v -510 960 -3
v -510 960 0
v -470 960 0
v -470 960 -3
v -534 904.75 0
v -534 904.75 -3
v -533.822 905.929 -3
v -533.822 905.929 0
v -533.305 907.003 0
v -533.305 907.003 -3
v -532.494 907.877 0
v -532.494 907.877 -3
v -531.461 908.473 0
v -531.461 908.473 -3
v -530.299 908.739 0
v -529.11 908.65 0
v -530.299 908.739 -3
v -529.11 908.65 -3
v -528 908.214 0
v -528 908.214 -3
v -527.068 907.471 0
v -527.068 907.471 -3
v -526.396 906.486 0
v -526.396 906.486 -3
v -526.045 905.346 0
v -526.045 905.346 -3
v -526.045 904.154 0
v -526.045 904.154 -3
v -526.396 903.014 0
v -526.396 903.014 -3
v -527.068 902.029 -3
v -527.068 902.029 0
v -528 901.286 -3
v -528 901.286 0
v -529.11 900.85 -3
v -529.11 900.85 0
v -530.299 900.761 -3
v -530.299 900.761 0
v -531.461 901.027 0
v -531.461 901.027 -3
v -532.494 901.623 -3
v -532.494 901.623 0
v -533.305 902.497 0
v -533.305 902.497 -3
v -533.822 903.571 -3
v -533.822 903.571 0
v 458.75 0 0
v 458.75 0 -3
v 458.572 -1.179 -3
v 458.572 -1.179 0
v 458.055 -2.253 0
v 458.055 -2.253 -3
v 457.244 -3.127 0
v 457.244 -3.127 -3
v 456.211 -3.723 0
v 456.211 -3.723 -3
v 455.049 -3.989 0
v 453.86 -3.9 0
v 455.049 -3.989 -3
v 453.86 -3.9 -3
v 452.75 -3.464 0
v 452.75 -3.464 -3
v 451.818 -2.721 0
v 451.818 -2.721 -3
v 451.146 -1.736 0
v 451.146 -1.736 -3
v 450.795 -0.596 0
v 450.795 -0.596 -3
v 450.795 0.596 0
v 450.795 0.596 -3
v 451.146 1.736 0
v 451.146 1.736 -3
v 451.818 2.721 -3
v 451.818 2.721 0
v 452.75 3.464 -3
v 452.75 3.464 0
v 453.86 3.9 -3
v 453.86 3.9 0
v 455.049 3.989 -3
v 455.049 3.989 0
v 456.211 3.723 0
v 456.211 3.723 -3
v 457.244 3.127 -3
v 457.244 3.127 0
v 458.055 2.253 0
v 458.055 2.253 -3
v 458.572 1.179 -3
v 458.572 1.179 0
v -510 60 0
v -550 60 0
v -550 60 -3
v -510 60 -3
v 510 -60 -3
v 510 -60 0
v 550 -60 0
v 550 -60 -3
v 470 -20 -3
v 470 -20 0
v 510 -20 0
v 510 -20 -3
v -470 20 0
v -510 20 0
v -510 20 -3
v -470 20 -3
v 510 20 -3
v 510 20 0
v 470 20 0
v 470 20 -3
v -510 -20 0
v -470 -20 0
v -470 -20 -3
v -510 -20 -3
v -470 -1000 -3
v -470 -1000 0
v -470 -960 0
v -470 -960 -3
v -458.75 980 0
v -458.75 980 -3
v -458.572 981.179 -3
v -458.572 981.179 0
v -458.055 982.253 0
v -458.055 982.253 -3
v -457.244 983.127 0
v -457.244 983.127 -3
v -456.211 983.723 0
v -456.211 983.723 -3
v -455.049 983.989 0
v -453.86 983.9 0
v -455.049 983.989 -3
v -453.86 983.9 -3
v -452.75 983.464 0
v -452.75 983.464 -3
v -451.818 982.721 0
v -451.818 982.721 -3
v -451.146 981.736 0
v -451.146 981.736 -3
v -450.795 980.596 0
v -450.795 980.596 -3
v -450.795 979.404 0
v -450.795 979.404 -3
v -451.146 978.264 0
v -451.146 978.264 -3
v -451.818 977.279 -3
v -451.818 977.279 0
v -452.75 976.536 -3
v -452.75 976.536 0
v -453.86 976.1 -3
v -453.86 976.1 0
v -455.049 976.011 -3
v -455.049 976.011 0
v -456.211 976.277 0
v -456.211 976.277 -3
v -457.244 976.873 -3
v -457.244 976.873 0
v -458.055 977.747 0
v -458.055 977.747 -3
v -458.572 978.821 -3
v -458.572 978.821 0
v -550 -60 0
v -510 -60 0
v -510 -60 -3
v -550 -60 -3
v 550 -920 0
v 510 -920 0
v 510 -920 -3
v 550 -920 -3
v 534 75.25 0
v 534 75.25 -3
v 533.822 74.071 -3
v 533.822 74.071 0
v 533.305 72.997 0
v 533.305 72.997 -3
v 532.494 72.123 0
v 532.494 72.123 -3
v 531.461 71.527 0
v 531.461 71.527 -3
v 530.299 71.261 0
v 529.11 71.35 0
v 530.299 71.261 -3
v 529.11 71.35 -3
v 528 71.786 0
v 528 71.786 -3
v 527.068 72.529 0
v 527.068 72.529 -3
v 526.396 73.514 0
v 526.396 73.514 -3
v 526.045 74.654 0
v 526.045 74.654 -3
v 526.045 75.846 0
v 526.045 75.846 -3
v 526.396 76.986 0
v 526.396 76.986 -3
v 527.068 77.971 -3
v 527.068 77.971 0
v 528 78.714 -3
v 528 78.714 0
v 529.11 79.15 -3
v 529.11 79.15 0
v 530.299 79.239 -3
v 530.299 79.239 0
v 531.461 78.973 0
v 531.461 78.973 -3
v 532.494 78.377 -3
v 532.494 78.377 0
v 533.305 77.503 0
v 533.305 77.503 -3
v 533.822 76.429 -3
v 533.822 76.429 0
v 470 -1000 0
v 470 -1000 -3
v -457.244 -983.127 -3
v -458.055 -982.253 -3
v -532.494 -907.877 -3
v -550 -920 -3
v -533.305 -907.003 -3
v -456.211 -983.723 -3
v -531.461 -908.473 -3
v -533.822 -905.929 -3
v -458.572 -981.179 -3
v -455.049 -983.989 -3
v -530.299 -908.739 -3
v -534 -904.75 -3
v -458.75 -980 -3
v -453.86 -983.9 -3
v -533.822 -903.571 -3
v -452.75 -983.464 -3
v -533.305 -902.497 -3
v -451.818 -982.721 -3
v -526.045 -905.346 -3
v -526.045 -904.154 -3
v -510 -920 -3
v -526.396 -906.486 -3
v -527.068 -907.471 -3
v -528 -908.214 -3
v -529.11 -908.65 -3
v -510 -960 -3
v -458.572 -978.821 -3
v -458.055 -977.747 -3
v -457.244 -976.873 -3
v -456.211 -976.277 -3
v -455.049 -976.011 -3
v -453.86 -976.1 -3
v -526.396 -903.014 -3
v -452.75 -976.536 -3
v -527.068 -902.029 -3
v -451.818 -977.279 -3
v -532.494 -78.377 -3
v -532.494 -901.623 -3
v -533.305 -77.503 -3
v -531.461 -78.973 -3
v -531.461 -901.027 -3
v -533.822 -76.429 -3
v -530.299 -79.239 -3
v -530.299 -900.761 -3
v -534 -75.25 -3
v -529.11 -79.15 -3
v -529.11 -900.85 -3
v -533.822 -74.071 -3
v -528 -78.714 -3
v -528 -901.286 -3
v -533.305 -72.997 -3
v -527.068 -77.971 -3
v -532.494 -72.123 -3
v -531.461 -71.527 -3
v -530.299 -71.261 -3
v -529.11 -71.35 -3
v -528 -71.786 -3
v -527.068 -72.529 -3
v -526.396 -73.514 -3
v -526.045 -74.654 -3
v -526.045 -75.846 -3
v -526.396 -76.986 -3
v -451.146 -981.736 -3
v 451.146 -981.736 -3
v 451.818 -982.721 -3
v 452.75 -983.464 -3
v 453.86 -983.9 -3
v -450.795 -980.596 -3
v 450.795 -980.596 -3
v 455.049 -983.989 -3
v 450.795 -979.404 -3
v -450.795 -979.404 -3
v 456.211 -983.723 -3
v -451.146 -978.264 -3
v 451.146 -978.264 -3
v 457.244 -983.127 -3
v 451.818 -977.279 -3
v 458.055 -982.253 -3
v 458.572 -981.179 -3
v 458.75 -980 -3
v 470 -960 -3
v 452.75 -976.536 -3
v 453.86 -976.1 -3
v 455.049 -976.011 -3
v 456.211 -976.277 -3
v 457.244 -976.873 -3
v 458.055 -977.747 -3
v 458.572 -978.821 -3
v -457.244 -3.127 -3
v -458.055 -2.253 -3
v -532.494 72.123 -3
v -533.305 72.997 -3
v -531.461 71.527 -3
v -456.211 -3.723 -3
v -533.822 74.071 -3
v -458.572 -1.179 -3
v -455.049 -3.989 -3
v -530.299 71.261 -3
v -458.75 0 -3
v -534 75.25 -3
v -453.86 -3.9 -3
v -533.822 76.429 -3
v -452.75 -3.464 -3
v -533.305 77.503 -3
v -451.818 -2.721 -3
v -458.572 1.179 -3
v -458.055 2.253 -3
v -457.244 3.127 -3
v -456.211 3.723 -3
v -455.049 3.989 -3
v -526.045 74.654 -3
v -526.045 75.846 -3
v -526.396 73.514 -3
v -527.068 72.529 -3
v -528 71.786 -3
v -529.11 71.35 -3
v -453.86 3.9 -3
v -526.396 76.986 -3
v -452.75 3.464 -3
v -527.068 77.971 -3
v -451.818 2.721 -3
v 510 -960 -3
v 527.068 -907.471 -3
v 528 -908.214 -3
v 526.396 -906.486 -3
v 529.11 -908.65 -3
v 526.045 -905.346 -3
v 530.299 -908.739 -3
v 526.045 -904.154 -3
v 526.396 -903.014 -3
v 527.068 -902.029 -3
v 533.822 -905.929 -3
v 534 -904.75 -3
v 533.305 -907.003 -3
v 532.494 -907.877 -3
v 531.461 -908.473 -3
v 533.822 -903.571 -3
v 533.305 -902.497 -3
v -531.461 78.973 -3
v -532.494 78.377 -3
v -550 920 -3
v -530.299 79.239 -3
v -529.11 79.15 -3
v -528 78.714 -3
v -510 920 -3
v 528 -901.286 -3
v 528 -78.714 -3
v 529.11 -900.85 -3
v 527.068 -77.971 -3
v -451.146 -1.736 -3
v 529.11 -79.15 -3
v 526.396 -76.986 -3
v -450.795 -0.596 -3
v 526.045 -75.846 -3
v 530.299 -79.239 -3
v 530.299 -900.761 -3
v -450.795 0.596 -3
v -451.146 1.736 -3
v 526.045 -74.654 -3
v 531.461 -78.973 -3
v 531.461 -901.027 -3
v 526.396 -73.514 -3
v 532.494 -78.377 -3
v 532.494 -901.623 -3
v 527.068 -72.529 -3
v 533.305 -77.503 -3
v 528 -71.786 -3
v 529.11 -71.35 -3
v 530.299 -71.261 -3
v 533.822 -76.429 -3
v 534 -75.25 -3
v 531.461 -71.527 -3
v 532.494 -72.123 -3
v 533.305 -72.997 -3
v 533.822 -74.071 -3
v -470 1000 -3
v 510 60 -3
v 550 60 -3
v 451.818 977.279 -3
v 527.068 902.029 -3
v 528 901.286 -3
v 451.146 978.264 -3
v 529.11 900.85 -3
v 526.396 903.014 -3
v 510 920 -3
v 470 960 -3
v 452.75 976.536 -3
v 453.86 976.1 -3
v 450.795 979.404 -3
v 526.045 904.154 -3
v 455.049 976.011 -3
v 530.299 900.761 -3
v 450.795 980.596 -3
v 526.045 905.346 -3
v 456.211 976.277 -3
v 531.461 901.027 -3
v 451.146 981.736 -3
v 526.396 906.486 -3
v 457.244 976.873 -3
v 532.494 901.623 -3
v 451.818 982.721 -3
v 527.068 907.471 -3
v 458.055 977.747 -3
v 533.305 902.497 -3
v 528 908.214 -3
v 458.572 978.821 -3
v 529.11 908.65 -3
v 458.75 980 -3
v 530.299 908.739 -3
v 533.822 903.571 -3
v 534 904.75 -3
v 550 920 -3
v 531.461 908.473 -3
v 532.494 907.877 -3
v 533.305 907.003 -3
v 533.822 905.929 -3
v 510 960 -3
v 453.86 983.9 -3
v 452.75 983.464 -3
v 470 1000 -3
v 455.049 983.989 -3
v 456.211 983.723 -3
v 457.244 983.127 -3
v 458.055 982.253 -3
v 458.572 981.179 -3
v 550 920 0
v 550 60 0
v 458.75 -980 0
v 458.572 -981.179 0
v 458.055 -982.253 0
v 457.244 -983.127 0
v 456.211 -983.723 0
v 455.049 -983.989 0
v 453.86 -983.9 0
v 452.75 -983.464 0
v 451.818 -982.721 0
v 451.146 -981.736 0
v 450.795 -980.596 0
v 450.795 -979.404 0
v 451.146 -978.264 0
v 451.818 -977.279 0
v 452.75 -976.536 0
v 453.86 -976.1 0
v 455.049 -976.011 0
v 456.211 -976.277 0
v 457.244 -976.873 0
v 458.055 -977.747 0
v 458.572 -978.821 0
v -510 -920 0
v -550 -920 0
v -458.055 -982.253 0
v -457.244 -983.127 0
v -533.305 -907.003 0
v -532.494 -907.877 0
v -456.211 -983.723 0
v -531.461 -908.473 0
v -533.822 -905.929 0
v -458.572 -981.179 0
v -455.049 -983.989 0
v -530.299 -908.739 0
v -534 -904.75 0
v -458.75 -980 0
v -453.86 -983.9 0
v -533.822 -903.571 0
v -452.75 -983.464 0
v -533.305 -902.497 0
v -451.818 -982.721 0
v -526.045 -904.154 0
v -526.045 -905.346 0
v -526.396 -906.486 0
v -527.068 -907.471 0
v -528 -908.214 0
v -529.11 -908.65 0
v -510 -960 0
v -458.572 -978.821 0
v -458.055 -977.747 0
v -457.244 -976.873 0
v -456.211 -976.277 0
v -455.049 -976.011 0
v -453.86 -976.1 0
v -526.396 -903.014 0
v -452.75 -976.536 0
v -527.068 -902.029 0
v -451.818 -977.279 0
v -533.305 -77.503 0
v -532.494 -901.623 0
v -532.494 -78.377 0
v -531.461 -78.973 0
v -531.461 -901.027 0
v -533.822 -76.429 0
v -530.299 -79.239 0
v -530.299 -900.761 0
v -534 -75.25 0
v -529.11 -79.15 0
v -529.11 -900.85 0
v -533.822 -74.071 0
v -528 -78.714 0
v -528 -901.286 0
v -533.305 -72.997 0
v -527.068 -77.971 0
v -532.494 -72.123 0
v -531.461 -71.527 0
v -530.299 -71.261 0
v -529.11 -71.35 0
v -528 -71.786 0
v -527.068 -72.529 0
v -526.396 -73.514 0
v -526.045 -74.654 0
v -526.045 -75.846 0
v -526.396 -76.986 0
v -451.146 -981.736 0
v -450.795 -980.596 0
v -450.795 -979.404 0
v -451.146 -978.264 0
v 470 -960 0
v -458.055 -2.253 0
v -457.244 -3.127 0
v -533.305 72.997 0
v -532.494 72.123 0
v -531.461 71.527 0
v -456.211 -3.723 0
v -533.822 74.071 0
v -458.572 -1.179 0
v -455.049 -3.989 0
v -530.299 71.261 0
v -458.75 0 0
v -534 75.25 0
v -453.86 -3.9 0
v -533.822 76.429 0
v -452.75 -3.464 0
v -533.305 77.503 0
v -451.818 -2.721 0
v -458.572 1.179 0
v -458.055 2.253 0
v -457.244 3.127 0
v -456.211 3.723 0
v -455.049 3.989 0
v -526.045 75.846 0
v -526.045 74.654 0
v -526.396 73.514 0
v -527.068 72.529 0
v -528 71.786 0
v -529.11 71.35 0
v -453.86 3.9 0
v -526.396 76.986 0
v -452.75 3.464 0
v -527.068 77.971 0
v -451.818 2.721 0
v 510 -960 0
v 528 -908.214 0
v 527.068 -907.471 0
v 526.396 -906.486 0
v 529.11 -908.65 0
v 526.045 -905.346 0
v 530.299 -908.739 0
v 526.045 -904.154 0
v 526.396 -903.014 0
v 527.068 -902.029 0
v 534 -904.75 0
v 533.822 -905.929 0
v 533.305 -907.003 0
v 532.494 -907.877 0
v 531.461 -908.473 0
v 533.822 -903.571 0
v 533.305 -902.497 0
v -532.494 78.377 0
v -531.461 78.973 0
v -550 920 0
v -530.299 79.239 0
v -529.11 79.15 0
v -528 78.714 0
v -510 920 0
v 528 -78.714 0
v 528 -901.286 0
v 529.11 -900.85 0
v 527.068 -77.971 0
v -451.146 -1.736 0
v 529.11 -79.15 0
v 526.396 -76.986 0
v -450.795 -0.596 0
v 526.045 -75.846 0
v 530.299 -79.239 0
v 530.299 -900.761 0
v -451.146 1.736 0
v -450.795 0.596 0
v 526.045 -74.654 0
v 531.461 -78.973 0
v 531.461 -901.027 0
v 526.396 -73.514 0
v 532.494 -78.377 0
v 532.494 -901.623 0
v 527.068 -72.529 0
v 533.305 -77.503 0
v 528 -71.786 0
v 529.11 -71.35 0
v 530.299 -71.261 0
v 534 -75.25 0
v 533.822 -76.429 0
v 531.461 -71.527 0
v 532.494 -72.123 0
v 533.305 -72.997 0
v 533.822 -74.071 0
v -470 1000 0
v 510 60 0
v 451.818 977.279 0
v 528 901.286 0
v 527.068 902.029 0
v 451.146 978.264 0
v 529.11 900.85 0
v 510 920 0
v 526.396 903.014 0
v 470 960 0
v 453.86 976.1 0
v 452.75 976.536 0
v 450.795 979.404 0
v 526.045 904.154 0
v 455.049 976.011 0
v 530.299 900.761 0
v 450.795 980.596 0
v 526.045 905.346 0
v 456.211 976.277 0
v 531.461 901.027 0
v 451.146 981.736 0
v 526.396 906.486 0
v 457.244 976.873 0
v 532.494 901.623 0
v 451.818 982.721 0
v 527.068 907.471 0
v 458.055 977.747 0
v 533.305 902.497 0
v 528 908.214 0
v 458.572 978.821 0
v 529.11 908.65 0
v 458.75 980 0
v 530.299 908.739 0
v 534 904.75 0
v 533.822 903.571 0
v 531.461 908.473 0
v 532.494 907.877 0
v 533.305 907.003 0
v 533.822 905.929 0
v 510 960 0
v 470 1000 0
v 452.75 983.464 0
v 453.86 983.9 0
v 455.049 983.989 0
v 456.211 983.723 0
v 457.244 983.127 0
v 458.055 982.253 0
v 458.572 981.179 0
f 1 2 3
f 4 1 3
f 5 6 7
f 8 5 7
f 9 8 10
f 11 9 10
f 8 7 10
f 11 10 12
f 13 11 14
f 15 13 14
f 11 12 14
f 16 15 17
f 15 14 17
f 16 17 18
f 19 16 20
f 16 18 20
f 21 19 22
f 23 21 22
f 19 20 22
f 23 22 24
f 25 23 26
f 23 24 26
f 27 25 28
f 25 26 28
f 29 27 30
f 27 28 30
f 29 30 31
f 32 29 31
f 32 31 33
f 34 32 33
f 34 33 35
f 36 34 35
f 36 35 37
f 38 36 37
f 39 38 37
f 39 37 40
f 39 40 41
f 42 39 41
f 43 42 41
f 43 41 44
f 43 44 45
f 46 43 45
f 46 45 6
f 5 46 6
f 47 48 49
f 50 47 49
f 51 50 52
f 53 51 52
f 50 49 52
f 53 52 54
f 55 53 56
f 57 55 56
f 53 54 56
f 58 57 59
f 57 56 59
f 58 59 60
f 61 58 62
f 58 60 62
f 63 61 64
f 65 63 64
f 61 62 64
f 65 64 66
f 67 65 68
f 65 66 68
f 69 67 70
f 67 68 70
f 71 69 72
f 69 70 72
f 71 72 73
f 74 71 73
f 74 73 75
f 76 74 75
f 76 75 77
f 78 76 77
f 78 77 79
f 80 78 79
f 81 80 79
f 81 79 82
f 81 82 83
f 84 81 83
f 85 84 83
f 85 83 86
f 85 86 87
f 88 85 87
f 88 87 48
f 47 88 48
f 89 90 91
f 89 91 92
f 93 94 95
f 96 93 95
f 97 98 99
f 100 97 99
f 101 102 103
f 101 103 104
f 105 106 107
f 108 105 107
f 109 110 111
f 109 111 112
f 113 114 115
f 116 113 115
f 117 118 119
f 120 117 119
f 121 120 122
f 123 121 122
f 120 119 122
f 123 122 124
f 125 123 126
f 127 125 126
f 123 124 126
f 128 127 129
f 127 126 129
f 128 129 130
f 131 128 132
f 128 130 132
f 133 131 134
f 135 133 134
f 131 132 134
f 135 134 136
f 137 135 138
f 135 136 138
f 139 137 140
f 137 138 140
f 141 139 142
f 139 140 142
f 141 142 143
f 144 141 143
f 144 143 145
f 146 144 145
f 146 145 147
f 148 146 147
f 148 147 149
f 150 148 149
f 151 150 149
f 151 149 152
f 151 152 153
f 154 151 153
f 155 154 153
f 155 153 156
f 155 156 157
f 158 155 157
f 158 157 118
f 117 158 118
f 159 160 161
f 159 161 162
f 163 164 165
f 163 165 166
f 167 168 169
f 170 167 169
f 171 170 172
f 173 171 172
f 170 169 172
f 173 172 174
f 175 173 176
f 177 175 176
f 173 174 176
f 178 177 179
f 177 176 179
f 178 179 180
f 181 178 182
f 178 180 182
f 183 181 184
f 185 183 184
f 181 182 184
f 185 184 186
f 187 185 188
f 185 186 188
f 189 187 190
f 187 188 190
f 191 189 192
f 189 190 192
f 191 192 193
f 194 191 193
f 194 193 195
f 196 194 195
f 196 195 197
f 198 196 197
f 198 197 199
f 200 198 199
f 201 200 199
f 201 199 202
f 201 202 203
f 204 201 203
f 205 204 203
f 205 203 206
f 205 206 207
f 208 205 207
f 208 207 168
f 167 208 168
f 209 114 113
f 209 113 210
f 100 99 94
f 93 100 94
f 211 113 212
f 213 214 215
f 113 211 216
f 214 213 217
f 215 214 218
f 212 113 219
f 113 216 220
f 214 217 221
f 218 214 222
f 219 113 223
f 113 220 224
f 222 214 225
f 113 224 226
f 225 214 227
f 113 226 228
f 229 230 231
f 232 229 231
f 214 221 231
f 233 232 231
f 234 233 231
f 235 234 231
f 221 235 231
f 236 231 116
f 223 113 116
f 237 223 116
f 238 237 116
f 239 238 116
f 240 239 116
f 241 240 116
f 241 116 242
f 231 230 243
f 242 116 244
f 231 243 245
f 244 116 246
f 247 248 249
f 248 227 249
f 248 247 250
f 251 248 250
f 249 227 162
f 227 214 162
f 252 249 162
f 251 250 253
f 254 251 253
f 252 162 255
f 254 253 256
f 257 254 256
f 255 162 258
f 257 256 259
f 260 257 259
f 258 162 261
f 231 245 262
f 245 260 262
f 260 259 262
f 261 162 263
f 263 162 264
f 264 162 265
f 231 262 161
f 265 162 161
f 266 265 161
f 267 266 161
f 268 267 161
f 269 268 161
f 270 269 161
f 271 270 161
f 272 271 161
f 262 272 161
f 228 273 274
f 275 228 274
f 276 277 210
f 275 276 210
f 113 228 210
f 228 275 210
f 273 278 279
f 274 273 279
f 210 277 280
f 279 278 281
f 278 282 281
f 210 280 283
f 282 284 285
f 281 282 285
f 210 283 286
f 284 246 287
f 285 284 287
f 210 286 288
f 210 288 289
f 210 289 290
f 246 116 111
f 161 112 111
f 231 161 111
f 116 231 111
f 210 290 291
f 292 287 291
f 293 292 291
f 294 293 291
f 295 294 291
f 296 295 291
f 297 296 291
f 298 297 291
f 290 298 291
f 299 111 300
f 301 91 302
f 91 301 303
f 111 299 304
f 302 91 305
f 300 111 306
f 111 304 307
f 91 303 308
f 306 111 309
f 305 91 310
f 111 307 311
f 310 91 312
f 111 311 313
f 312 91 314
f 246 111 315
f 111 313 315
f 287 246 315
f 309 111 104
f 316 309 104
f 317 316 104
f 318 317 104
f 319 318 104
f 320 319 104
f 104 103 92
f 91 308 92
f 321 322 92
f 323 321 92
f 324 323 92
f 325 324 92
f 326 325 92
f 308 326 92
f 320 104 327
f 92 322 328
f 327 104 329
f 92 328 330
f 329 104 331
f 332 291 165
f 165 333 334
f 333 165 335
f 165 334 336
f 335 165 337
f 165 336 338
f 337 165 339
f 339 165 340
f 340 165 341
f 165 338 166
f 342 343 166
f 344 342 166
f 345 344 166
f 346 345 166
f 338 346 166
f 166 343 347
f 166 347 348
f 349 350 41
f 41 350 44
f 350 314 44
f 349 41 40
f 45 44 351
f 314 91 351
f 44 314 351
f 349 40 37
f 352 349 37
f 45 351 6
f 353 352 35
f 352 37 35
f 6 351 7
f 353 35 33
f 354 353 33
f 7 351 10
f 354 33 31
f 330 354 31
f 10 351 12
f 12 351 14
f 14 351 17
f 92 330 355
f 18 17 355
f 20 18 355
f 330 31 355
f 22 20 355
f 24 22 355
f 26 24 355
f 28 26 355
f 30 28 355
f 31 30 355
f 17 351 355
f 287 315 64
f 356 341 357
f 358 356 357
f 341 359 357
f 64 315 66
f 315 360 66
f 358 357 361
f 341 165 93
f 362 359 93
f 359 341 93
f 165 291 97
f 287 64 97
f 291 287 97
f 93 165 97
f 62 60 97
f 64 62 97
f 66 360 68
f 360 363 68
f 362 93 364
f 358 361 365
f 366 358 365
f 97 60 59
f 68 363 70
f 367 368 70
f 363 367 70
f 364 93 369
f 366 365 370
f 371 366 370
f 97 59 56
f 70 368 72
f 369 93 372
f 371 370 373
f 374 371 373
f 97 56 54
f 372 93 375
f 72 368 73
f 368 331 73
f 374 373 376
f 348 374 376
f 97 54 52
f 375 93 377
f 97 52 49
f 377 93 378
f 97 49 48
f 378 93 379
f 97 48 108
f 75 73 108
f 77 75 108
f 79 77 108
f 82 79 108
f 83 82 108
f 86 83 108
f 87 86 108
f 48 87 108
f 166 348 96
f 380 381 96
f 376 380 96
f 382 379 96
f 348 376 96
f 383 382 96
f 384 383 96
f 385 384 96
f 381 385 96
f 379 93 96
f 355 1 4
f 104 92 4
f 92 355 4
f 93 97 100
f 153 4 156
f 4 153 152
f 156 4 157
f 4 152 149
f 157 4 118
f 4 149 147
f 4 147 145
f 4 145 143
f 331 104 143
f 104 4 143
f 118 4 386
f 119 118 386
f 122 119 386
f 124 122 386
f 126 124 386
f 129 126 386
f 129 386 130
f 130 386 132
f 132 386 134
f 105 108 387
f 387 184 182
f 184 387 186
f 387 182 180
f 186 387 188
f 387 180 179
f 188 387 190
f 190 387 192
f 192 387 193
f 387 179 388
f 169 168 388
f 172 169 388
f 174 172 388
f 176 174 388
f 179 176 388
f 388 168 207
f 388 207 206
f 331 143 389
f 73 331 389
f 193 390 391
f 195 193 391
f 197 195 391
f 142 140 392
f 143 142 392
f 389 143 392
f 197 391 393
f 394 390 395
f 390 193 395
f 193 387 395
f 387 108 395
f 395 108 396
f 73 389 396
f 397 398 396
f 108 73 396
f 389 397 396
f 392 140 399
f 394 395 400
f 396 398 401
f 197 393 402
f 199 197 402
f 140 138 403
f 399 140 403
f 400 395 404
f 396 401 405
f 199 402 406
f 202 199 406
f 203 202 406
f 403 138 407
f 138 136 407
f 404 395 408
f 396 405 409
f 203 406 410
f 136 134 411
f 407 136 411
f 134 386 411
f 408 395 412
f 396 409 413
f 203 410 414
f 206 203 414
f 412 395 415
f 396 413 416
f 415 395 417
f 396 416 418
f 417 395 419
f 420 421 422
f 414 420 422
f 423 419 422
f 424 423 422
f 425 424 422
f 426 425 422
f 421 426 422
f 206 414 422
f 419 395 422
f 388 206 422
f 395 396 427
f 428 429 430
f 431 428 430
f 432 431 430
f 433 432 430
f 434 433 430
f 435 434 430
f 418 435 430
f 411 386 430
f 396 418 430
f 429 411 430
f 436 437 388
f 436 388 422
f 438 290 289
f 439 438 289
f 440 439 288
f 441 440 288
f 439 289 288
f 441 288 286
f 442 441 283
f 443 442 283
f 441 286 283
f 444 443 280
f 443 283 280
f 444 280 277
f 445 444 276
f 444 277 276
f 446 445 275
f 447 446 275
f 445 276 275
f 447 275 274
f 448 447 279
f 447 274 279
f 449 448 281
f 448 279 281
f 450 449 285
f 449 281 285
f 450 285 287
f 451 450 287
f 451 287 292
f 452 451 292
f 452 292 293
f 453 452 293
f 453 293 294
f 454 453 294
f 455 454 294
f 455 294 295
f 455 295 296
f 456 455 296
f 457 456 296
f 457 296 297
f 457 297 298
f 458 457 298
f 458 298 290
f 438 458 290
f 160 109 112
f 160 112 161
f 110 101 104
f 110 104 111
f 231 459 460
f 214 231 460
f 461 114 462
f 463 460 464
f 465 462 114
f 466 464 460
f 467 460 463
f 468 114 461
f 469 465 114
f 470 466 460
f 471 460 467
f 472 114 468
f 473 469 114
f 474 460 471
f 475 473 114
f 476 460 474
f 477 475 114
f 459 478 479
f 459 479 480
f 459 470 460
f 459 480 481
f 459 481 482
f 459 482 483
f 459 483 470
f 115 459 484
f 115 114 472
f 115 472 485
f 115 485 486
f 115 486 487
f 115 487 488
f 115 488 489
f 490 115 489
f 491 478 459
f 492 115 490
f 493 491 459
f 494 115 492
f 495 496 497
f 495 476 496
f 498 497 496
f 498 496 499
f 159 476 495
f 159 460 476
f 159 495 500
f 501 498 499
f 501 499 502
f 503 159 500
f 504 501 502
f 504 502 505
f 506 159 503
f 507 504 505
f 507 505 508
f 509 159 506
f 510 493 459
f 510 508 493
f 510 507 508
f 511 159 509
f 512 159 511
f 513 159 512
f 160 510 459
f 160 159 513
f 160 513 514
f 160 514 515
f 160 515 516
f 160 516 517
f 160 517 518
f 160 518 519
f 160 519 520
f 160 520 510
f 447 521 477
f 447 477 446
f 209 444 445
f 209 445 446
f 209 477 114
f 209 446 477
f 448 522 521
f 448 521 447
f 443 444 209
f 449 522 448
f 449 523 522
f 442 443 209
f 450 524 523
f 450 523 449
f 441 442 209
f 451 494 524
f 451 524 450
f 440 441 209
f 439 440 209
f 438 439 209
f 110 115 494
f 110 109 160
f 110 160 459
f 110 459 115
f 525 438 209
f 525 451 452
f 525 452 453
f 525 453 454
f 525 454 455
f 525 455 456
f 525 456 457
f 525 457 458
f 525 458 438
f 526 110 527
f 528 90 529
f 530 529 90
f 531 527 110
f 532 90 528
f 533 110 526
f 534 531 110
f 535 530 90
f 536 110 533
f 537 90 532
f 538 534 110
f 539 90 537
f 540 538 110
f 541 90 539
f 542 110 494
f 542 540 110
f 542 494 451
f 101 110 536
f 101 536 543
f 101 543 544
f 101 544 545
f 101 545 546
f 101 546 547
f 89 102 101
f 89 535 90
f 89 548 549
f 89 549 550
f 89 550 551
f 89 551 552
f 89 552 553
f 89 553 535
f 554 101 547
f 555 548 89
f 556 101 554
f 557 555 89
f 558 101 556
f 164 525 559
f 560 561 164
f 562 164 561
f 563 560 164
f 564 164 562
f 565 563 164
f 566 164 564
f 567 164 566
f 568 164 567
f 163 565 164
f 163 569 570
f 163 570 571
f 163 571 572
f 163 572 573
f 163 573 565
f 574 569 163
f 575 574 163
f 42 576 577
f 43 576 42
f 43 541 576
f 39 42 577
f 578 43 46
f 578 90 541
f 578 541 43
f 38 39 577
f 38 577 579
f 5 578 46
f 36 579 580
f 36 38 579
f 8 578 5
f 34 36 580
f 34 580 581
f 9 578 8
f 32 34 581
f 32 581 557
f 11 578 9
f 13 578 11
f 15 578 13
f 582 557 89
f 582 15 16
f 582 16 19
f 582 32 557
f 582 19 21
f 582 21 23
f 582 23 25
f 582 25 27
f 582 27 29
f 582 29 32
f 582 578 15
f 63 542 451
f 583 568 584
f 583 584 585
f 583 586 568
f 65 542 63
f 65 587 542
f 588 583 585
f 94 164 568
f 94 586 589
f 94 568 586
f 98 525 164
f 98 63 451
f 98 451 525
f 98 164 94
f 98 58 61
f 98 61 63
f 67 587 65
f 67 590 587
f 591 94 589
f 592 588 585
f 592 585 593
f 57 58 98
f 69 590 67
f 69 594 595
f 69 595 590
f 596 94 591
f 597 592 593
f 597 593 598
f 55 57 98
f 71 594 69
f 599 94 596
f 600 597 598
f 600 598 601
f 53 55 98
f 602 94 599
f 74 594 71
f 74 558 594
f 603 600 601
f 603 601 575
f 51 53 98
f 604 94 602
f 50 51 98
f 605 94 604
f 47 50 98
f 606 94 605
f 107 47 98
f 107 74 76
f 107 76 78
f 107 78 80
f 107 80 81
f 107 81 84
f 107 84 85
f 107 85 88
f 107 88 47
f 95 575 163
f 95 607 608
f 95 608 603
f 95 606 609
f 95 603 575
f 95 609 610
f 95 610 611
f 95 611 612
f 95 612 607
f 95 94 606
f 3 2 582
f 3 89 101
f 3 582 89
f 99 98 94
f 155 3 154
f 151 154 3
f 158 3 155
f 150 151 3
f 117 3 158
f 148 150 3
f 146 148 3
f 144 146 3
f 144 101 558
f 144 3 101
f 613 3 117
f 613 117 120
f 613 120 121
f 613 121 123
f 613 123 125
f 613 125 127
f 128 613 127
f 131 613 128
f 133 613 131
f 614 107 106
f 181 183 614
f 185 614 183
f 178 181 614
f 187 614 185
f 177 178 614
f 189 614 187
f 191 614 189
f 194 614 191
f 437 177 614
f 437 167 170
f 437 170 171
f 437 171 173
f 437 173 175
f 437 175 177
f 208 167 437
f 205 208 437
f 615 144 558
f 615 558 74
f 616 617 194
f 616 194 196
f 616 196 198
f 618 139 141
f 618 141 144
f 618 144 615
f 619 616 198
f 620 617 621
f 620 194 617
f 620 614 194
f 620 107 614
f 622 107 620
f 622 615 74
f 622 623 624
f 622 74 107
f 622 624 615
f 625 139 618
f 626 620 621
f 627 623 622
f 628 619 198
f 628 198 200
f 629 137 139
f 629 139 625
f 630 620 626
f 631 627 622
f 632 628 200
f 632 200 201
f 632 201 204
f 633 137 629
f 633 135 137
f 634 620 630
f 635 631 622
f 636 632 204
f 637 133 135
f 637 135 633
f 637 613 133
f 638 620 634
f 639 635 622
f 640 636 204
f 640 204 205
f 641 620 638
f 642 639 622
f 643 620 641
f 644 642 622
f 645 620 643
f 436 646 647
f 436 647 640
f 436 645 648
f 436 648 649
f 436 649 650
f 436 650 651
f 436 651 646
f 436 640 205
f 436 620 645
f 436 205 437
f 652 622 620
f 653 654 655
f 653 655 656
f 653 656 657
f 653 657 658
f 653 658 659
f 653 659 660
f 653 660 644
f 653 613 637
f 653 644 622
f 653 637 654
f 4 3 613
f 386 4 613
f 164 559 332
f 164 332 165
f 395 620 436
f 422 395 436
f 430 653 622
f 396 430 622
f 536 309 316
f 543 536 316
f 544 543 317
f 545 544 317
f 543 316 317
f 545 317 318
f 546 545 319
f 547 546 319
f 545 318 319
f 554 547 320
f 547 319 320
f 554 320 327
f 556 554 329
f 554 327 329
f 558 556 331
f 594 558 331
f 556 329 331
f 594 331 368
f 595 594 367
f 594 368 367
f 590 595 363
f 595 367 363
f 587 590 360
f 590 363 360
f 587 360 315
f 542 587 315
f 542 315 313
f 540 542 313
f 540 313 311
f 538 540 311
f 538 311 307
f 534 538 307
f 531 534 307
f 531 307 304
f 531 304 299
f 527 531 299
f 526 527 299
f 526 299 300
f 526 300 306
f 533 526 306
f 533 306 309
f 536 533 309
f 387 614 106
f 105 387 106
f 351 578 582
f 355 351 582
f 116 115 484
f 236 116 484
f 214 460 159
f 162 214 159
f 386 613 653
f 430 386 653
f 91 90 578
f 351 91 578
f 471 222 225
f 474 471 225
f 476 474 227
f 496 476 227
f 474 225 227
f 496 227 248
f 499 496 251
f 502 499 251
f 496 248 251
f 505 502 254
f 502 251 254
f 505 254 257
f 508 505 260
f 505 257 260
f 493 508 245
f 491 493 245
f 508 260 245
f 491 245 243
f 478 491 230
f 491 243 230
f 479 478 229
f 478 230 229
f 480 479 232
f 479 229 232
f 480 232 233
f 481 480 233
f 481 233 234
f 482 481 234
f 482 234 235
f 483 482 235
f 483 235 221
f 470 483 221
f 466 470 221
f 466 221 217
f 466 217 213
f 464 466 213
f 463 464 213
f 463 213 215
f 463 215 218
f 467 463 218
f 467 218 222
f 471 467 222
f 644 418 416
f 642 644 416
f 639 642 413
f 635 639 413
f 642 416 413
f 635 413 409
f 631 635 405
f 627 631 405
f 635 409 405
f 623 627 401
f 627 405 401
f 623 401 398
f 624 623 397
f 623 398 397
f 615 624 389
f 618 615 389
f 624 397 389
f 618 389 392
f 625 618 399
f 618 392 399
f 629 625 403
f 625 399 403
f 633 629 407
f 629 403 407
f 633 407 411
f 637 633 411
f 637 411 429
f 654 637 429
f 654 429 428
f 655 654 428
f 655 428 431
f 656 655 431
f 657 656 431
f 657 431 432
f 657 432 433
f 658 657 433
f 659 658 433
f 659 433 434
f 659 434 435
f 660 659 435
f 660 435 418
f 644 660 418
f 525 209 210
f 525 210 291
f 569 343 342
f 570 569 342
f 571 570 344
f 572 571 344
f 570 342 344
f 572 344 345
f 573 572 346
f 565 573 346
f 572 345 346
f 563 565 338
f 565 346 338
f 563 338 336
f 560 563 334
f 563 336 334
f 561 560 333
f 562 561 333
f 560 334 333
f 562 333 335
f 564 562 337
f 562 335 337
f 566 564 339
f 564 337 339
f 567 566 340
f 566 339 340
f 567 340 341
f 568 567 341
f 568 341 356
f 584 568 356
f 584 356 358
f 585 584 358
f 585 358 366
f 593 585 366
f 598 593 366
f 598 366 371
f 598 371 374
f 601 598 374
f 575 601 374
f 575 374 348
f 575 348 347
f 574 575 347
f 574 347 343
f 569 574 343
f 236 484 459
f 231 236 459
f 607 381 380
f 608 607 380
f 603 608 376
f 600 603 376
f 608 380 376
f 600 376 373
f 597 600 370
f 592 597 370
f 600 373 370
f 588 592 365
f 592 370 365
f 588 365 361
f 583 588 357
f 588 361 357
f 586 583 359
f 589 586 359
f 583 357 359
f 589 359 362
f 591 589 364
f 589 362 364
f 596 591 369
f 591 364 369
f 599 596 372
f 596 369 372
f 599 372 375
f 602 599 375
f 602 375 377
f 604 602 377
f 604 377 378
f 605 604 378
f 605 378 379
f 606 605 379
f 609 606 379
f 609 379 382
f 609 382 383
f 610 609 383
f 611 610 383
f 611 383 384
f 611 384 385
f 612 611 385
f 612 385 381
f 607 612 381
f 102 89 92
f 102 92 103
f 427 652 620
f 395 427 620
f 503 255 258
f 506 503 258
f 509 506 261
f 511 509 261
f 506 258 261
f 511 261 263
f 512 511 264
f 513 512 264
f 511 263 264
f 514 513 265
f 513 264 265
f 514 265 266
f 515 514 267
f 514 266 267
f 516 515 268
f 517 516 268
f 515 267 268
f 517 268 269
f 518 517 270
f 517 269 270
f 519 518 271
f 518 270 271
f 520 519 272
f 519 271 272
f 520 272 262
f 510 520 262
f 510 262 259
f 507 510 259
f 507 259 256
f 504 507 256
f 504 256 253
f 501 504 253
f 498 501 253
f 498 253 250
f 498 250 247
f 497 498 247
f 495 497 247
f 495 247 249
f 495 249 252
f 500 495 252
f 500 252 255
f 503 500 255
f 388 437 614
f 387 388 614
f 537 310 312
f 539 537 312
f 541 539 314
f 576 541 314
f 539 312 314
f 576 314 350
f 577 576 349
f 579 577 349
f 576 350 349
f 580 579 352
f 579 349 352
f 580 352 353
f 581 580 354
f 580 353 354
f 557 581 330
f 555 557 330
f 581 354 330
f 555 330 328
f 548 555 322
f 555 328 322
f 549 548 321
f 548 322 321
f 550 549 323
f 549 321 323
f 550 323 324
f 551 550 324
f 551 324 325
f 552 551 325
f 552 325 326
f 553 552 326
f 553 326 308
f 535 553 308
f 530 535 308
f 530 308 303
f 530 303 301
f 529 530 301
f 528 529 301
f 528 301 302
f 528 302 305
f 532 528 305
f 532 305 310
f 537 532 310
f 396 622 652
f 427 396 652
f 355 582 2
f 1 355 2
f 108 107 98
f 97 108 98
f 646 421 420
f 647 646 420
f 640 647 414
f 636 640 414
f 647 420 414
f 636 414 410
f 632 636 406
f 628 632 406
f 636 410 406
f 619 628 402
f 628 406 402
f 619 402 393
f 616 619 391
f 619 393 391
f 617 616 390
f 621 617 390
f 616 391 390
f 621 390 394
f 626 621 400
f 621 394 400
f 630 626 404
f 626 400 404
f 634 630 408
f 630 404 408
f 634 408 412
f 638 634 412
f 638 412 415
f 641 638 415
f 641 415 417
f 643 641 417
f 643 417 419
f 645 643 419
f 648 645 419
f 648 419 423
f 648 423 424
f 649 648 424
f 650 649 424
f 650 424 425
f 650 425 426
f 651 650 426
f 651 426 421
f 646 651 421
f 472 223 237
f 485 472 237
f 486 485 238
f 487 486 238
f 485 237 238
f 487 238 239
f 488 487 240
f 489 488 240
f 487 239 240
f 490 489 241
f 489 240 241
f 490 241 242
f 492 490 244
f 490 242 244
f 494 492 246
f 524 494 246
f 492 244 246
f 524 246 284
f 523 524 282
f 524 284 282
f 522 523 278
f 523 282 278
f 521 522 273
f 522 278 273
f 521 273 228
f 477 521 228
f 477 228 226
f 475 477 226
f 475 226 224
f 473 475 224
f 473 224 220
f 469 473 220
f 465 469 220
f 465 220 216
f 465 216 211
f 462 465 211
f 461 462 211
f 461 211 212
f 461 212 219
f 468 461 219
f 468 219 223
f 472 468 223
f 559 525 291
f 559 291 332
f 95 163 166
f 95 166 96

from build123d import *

# Parameters (mm, degrees)
SCHIZZO1_W               = 1100
SCHIZZO1_H               = 2000
BASE_FLANGIA1_DEPTH      = 3
TAGLIO_ESTRUSIONE1_DEPTH = 1142.275164016
TAGLIO_ESTRUSIONE3_DEPTH = 1142.275164016
SCHIZZO6_R               = 4
TAGLIO_ESTRUSIONE4_DEPTH = 1142.275164016


# Sheet-metal steps are written as plain solids
with BuildPart() as part:
    # Schizzo1 → Base-Flangia1 (new body)
    with BuildSketch(Plane.XY):
        Rectangle(SCHIZZO1_W, SCHIZZO1_H)
    extrude(amount=-BASE_FLANGIA1_DEPTH)

    # Schizzo2 → Taglio-Estrusione1 (cut, through all)
    with BuildSketch(Plane.XY):
        Polygon((-550, -1000), (-470, -1000), (-470, -960), (-510, -960), (-510, -920), (-550, -920), align=None)
        Polygon((550, -1000), (470, -1000), (470, -960), (510, -960), (510, -920), (550, -920), align=None)
        Polygon((550, 1000), (470, 1000), (470, 960), (510, 960), (510, 920), (550, 920), align=None)
        Polygon((-550, 1000), (-550, 920), (-510, 920), (-510, 960), (-470, 960), (-470, 1000), align=None)
    extrude(amount=-TAGLIO_ESTRUSIONE1_DEPTH, mode=Mode.SUBTRACT)

    # Schizzo4 → Taglio-Estrusione3 (cut, through all)
    with BuildSketch(Plane.XY):
        Polygon((-550, -60), (-550, 60), (-510, 60), (-510, 20), (-470, 20), (-470, -20), (-510, -20), (-510, -60), align=None)
        Polygon((510, 20), (470, 20), (470, -20), (510, -20), (510, -60), (550, -60), (550, 60), (510, 60), align=None)
    extrude(amount=-TAGLIO_ESTRUSIONE3_DEPTH, mode=Mode.SUBTRACT)

    # Schizzo6 → Taglio-Estrusione4 (cut, through all)
    with BuildSketch(Plane(origin=(0, 0, -3), x_dir=(-1, 0, 0), z_dir=(0, 0, -1))):
        with Locations(Location((-454.75, -980, 0), (0, 0, 180))):
            Circle(SCHIZZO6_R)
        with Locations(Location((-530, -904.75, 0), (0, 0, 180))):
            Circle(SCHIZZO6_R)
        with Locations(Location((-530, -75.25, 0), (0, 0, 180))):
            Circle(SCHIZZO6_R)
        with Locations(Location((-454.75, 0, 0), (0, 0, 180))):
            Circle(SCHIZZO6_R)
        with Locations(Location((-530, 75.25, 0), (0, 0, 180))):
            Circle(SCHIZZO6_R)
        with Locations(Location((-530, 904.75, 0), (0, 0, 180))):
            Circle(SCHIZZO6_R)
        with Locations(Location((-454.75, 980, 0), (0, 0, 180))):
            Circle(SCHIZZO6_R)
        with Locations((454.75, 980)):
            Circle(SCHIZZO6_R)
        with Locations((530, 904.75)):
            Circle(SCHIZZO6_R)
        with Locations((530, 75.25)):
            Circle(SCHIZZO6_R)
        with Locations((454.75, 0)):
            Circle(SCHIZZO6_R)
        with Locations((530, -75.25)):
            Circle(SCHIZZO6_R)
        with Locations((530, -904.75)):
            Circle(SCHIZZO6_R)
        with Locations((454.75, -980)):
            Circle(SCHIZZO6_R)
    extrude(amount=-TAGLIO_ESTRUSIONE4_DEPTH, mode=Mode.SUBTRACT)


solid = part.part
